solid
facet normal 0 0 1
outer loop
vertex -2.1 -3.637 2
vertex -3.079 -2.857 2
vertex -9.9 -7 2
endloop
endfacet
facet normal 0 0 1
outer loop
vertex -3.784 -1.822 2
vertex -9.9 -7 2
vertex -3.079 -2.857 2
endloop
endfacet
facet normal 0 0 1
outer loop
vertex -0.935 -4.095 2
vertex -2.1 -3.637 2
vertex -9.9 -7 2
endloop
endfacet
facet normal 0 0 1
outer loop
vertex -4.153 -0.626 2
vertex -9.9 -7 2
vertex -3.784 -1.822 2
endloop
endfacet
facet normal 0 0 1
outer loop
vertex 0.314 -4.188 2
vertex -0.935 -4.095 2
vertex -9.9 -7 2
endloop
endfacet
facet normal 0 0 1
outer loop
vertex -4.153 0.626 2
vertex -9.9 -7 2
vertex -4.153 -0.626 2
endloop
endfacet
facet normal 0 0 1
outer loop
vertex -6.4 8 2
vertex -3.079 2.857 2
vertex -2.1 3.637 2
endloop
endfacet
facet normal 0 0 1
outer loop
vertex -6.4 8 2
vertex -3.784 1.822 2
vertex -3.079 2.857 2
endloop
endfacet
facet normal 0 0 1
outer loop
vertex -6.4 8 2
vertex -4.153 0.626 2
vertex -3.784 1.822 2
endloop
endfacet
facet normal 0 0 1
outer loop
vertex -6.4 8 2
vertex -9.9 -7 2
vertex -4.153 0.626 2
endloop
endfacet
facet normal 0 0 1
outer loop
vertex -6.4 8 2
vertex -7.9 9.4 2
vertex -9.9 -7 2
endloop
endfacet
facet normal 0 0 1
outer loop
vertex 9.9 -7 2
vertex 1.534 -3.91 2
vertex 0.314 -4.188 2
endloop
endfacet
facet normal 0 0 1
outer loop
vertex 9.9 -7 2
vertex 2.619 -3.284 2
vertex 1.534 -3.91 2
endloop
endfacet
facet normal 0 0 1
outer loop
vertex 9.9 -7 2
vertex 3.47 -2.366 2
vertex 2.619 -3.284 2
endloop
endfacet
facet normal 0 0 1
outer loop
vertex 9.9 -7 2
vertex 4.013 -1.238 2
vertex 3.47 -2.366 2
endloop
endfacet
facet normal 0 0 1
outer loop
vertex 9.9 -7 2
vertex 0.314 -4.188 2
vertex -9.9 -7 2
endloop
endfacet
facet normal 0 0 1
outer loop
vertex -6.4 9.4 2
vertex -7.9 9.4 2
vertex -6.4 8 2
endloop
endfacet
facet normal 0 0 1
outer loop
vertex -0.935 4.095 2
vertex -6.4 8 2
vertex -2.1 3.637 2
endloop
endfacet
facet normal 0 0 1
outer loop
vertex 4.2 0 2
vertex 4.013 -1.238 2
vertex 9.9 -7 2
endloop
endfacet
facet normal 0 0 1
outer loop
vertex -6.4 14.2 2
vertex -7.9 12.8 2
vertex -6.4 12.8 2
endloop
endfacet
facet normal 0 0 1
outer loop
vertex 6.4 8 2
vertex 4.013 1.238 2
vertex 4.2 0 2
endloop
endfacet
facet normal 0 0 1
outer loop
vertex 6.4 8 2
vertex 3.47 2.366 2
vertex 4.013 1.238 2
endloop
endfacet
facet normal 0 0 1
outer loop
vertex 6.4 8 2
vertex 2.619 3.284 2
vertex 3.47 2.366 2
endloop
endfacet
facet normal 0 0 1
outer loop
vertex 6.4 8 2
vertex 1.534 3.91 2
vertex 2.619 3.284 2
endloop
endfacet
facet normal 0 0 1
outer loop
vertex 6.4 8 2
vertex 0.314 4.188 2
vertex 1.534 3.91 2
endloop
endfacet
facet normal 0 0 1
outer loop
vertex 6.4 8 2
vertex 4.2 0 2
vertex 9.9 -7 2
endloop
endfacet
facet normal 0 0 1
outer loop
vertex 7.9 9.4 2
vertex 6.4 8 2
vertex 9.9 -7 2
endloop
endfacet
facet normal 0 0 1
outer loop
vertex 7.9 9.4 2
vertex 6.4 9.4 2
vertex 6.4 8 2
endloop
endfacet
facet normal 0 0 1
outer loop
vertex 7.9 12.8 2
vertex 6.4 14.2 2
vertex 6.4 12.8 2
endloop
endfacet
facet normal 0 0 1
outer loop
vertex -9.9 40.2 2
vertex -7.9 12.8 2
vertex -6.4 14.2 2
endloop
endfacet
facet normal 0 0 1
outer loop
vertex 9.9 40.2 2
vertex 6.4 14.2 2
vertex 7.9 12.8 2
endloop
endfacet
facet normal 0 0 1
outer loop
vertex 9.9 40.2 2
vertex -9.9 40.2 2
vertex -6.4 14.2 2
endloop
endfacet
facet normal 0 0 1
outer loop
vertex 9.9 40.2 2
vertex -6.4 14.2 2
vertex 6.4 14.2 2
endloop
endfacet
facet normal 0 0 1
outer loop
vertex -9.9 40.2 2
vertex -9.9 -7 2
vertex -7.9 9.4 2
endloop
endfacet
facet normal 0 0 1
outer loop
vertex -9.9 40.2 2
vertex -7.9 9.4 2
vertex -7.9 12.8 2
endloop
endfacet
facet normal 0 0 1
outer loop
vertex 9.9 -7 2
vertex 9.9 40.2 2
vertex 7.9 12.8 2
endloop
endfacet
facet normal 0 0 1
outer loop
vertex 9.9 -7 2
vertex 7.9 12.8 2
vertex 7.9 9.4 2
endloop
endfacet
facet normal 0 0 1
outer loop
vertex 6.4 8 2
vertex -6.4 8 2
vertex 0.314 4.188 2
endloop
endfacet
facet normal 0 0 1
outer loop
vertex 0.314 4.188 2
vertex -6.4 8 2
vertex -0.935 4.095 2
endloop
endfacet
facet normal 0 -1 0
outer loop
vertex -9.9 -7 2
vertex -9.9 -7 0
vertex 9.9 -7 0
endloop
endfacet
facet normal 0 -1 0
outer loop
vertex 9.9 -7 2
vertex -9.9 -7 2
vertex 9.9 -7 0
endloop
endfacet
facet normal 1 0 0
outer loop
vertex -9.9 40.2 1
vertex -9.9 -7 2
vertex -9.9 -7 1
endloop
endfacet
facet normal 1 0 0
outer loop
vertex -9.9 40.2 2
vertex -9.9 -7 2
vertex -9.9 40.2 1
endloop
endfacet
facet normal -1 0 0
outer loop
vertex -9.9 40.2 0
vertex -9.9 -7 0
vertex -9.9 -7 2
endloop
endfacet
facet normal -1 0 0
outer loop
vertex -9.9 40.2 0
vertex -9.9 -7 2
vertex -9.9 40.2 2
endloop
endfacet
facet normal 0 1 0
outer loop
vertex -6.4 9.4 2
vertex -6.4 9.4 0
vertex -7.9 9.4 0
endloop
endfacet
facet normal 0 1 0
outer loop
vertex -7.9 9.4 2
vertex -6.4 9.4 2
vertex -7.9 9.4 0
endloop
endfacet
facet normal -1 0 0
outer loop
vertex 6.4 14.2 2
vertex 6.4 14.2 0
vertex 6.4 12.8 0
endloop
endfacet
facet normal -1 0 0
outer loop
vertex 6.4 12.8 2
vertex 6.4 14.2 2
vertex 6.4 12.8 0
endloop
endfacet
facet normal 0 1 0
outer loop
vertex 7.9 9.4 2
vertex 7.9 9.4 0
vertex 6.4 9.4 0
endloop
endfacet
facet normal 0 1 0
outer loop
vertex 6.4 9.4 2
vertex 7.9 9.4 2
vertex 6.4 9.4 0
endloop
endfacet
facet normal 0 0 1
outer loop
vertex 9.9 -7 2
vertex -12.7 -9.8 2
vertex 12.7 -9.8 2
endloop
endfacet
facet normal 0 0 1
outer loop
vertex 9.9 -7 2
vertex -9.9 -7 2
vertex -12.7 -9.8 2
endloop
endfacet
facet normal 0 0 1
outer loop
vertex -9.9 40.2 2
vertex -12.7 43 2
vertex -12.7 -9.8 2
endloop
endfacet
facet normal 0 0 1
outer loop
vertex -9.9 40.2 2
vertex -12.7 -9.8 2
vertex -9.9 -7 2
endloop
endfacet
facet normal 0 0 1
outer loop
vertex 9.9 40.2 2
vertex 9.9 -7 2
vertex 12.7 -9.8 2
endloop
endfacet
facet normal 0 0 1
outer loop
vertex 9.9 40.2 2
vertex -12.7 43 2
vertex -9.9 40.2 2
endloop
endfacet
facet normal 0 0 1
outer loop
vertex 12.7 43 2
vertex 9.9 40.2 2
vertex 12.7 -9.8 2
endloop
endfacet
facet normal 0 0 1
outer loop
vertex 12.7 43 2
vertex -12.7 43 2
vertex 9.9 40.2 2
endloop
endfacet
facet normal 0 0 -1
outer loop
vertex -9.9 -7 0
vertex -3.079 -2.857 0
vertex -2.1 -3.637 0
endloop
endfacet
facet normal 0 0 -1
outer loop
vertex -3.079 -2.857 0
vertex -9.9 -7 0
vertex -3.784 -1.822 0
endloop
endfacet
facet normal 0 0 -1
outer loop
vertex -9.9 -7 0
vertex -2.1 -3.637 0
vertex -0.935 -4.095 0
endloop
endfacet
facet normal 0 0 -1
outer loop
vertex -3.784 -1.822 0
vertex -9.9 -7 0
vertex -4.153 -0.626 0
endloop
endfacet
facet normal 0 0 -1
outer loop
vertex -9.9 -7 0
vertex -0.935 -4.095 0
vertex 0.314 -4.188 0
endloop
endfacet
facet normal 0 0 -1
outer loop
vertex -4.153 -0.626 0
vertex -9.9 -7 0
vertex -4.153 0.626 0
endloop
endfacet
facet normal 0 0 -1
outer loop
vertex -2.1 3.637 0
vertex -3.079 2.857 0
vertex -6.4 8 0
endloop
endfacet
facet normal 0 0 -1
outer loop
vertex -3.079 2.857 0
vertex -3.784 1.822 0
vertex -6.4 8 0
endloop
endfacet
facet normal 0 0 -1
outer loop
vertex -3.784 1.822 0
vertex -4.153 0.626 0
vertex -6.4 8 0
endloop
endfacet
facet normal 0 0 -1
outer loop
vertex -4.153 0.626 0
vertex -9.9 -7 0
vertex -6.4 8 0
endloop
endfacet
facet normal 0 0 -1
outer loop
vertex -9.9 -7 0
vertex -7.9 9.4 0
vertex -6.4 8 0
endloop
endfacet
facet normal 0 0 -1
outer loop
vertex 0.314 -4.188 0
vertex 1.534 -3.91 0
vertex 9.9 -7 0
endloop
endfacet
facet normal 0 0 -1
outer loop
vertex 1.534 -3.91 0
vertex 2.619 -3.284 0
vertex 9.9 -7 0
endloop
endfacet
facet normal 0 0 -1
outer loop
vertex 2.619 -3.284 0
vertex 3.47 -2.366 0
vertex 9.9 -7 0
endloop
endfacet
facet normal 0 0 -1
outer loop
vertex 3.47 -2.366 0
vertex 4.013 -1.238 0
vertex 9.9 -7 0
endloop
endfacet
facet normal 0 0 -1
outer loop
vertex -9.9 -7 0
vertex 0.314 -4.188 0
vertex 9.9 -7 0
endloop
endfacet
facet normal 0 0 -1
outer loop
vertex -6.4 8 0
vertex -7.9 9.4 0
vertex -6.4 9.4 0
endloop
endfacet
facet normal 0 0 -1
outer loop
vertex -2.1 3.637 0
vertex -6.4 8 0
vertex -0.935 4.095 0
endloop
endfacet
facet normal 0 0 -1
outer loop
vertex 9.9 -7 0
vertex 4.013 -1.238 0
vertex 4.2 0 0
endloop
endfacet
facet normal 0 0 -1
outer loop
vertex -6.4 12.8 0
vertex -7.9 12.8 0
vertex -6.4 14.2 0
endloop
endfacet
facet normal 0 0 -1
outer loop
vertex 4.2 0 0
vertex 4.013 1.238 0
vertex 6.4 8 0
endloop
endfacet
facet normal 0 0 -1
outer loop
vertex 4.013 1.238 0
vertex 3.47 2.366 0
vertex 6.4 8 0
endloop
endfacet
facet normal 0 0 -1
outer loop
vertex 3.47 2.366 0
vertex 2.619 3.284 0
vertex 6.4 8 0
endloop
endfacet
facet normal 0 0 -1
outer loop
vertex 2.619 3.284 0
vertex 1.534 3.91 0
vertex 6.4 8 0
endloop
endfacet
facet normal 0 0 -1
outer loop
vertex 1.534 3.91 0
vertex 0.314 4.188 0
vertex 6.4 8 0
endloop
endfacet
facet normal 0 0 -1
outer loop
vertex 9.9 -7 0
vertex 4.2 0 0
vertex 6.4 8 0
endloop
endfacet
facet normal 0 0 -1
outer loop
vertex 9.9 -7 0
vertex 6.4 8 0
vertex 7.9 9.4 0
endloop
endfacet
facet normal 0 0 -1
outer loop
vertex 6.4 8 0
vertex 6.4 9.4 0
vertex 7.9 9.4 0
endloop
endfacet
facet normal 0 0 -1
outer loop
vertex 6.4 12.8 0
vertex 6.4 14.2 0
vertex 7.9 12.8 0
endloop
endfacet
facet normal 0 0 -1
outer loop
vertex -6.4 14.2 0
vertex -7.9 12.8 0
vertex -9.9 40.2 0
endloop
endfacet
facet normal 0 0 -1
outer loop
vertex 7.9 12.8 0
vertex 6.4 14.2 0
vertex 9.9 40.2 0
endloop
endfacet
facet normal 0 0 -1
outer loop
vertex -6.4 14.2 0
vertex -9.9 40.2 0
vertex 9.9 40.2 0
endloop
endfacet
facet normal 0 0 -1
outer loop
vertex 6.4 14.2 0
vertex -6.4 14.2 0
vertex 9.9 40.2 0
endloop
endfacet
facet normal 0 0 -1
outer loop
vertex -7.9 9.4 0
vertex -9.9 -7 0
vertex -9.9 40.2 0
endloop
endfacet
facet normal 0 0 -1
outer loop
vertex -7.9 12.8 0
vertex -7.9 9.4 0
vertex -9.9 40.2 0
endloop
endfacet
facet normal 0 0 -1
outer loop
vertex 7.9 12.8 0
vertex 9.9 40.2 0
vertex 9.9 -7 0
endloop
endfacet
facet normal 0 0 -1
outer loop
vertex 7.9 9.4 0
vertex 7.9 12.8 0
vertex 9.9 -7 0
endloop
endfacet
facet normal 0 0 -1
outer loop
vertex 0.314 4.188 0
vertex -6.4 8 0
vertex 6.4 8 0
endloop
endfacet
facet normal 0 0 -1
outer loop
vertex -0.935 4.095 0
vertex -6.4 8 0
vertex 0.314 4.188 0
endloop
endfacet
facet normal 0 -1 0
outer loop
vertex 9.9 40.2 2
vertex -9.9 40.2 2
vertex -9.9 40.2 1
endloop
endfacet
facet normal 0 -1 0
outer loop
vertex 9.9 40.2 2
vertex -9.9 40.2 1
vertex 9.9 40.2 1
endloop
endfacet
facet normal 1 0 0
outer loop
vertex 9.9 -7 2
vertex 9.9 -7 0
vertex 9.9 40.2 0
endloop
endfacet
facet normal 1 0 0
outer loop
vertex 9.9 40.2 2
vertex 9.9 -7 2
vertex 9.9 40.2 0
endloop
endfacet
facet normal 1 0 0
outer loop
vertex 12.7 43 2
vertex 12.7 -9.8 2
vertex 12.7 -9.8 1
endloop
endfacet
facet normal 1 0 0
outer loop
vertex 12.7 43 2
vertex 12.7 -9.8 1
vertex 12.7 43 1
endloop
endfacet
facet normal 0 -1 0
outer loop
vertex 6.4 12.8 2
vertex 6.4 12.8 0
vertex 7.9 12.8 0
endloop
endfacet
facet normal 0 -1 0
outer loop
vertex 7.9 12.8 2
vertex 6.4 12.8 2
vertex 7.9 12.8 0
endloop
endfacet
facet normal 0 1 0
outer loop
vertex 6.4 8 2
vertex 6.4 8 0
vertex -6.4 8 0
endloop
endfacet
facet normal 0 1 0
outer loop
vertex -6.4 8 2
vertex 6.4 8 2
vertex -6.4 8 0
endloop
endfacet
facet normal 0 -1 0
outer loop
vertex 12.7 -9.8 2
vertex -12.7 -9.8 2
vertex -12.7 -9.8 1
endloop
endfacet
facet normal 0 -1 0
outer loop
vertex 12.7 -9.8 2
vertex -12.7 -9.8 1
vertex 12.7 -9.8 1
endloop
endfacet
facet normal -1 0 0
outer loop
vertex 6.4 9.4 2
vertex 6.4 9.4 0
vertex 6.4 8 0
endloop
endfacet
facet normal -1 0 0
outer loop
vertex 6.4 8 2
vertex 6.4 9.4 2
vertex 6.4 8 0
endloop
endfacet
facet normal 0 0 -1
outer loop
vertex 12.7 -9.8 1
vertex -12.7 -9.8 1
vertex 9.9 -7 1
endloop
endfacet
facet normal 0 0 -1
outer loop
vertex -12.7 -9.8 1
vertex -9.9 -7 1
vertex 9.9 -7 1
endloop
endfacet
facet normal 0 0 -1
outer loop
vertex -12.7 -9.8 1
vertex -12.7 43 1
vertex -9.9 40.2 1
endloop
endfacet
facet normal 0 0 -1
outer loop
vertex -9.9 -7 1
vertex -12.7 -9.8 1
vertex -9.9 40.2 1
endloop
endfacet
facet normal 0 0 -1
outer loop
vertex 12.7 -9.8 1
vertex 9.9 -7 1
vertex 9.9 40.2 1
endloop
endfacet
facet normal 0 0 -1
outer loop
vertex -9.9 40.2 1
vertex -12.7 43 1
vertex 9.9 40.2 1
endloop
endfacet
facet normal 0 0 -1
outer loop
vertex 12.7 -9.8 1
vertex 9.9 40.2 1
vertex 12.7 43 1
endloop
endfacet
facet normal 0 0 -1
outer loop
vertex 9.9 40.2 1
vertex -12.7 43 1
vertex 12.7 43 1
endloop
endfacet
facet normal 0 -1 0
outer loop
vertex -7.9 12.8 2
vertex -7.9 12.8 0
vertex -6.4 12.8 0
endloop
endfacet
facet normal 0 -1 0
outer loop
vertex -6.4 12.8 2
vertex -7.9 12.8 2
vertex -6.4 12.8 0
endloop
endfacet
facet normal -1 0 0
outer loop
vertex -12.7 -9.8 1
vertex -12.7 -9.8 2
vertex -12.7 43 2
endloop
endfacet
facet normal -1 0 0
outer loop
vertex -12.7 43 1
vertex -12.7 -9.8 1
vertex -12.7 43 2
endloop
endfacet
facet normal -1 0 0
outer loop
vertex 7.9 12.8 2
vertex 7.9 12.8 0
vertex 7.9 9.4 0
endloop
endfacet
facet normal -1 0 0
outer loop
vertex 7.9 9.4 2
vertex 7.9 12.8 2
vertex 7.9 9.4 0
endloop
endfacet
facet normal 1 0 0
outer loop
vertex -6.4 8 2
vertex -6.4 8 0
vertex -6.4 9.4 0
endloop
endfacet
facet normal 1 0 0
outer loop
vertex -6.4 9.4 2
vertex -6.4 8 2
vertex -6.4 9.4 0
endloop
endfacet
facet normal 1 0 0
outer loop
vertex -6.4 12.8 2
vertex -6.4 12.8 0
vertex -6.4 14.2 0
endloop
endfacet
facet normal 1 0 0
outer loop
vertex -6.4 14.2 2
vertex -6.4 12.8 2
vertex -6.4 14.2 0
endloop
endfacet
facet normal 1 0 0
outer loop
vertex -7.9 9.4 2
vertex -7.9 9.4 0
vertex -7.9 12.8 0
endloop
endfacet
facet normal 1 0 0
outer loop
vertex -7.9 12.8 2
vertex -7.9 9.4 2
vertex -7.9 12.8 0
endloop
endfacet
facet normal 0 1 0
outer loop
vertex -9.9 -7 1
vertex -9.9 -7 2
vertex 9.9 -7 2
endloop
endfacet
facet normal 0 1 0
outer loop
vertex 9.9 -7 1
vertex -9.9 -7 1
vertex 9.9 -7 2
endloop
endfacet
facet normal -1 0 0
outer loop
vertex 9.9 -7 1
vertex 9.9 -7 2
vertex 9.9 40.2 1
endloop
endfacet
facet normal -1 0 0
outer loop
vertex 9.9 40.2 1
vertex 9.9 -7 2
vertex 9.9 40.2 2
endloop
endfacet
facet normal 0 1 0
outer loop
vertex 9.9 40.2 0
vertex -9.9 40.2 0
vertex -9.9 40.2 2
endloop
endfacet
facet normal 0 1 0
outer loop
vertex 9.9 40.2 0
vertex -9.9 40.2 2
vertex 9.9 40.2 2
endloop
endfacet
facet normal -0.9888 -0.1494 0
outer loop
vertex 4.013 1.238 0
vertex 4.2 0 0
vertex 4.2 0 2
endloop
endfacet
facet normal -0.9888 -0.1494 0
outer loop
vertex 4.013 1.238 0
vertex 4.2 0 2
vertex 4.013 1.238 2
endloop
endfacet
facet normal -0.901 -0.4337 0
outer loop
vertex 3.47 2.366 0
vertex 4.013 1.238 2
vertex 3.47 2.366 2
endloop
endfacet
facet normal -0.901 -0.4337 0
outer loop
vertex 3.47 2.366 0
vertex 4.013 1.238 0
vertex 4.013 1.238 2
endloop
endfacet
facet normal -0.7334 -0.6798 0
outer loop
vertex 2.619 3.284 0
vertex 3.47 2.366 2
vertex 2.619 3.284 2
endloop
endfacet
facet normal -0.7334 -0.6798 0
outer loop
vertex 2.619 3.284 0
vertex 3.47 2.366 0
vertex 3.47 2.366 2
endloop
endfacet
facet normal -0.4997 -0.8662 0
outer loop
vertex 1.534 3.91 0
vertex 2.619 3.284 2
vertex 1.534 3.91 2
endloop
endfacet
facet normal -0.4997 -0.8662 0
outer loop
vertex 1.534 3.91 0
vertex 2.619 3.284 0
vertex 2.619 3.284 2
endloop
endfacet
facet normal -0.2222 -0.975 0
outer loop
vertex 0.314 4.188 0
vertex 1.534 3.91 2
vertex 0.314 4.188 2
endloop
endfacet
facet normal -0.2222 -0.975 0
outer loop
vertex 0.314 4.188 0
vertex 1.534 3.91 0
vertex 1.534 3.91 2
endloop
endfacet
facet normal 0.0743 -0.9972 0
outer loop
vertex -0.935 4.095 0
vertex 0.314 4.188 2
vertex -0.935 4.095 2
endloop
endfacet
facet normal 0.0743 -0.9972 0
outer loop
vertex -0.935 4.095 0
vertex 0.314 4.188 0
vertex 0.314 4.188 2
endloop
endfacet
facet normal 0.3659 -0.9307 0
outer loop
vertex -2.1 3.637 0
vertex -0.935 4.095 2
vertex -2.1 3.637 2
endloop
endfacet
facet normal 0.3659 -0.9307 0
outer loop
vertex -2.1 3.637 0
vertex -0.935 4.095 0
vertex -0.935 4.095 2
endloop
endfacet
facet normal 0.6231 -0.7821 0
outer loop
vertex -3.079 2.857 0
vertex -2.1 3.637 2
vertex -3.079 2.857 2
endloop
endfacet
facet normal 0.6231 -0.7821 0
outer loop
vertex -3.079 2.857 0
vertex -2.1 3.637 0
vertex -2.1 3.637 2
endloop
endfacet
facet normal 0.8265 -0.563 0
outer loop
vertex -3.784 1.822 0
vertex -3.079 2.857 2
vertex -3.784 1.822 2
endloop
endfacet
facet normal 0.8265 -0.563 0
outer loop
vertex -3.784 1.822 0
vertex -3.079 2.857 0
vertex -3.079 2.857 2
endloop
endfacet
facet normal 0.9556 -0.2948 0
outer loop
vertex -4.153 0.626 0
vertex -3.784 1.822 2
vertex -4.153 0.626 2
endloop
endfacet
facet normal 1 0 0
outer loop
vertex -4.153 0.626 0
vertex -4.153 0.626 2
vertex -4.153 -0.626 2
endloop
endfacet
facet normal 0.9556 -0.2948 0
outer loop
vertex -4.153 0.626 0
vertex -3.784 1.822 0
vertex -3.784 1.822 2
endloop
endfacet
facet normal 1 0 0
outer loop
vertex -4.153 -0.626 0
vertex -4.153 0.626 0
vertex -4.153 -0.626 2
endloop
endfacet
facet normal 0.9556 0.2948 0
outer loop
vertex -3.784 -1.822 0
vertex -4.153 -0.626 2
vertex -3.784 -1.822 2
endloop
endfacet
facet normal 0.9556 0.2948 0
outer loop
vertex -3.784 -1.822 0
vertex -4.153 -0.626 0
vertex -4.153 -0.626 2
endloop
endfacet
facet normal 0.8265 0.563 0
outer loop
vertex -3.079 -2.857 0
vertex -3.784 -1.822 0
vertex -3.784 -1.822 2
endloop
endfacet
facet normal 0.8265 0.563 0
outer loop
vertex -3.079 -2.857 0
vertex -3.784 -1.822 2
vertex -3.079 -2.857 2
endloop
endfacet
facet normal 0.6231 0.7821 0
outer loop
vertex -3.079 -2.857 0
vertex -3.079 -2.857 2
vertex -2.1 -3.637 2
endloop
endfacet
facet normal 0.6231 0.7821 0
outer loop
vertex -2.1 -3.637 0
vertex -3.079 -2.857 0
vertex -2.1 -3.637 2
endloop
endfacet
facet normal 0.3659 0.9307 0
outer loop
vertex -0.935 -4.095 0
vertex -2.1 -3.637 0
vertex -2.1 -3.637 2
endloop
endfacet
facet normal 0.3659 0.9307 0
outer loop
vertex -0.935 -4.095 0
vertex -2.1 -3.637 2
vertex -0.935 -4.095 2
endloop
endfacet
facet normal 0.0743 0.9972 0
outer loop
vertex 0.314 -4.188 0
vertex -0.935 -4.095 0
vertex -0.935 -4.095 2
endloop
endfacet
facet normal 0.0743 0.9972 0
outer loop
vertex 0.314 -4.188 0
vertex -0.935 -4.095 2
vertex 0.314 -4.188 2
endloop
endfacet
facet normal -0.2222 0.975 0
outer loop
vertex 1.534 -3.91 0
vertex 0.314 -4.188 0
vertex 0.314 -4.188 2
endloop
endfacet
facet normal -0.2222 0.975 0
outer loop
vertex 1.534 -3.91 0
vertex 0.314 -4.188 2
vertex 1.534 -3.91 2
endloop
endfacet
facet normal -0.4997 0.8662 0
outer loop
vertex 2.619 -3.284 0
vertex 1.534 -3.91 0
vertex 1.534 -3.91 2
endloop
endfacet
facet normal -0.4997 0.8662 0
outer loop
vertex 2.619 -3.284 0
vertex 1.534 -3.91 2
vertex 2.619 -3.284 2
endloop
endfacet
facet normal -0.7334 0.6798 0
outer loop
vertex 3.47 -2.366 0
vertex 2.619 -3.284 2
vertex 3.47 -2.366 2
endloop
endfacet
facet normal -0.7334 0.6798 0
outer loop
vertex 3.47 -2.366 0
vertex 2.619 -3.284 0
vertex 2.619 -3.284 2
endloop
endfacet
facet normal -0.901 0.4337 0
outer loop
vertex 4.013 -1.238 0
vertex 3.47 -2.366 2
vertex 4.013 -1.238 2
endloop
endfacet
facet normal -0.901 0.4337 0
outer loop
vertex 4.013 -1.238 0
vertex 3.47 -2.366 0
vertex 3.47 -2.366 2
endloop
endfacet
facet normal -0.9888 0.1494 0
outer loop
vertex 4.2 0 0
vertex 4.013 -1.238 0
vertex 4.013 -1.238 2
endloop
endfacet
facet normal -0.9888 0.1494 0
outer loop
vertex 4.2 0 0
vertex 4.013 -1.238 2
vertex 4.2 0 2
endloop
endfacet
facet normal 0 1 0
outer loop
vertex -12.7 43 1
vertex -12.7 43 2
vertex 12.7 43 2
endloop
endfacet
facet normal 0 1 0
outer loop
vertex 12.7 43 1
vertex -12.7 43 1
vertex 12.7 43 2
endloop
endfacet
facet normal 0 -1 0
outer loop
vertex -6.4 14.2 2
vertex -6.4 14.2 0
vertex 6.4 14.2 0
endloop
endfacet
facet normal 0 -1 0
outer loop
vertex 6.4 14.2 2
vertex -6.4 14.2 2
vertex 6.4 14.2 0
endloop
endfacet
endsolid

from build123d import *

# Parameters (mm, degrees)
ESQUISSE2_W        = 19.8
ESQUISSE2_H        = 47.2
ESQUISSE2_R        = 4.2
BOSS_EXTRU_1_DEPTH = 2
ESQUISSE3_W        = 25.4
ESQUISSE3_H        = 52.8
ESQUISSE3_W_2      = 19.8
ESQUISSE3_H_2      = 47.2
BOSS_EXTRU_2_DEPTH = 1


with BuildPart() as part:
    # Esquisse2 → Boss.-Extru.1 (new body)
    with BuildSketch(Plane.XY):
        with Locations((0, 16.6)):
            Rectangle(ESQUISSE2_W, ESQUISSE2_H)
        Circle(ESQUISSE2_R, mode=Mode.SUBTRACT)
        Polygon((-6.4, 12.8), (-6.4, 14.2), (6.4, 14.2), (6.4, 12.8), (7.9, 12.8), (7.9, 9.4), (6.4, 9.4), (6.4, 8), (-6.4, 8), (-6.4, 9.4), (-7.9, 9.4), (-7.9, 12.8), align=None, mode=Mode.SUBTRACT)
    extrude(amount=BOSS_EXTRU_1_DEPTH)


with BuildPart() as body_2:
    # Esquisse3 → Boss.-Extru.2 (new body)
    with BuildSketch(Plane.XY.offset(2)):
        with Locations((0, 16.6)):
            Rectangle(ESQUISSE3_W, ESQUISSE3_H)
        with Locations((0, 16.6)):
            Rectangle(ESQUISSE3_W_2, ESQUISSE3_H_2, mode=Mode.SUBTRACT)
    extrude(amount=-BOSS_EXTRU_2_DEPTH)


solid = Compound([part.part, body_2.part])
